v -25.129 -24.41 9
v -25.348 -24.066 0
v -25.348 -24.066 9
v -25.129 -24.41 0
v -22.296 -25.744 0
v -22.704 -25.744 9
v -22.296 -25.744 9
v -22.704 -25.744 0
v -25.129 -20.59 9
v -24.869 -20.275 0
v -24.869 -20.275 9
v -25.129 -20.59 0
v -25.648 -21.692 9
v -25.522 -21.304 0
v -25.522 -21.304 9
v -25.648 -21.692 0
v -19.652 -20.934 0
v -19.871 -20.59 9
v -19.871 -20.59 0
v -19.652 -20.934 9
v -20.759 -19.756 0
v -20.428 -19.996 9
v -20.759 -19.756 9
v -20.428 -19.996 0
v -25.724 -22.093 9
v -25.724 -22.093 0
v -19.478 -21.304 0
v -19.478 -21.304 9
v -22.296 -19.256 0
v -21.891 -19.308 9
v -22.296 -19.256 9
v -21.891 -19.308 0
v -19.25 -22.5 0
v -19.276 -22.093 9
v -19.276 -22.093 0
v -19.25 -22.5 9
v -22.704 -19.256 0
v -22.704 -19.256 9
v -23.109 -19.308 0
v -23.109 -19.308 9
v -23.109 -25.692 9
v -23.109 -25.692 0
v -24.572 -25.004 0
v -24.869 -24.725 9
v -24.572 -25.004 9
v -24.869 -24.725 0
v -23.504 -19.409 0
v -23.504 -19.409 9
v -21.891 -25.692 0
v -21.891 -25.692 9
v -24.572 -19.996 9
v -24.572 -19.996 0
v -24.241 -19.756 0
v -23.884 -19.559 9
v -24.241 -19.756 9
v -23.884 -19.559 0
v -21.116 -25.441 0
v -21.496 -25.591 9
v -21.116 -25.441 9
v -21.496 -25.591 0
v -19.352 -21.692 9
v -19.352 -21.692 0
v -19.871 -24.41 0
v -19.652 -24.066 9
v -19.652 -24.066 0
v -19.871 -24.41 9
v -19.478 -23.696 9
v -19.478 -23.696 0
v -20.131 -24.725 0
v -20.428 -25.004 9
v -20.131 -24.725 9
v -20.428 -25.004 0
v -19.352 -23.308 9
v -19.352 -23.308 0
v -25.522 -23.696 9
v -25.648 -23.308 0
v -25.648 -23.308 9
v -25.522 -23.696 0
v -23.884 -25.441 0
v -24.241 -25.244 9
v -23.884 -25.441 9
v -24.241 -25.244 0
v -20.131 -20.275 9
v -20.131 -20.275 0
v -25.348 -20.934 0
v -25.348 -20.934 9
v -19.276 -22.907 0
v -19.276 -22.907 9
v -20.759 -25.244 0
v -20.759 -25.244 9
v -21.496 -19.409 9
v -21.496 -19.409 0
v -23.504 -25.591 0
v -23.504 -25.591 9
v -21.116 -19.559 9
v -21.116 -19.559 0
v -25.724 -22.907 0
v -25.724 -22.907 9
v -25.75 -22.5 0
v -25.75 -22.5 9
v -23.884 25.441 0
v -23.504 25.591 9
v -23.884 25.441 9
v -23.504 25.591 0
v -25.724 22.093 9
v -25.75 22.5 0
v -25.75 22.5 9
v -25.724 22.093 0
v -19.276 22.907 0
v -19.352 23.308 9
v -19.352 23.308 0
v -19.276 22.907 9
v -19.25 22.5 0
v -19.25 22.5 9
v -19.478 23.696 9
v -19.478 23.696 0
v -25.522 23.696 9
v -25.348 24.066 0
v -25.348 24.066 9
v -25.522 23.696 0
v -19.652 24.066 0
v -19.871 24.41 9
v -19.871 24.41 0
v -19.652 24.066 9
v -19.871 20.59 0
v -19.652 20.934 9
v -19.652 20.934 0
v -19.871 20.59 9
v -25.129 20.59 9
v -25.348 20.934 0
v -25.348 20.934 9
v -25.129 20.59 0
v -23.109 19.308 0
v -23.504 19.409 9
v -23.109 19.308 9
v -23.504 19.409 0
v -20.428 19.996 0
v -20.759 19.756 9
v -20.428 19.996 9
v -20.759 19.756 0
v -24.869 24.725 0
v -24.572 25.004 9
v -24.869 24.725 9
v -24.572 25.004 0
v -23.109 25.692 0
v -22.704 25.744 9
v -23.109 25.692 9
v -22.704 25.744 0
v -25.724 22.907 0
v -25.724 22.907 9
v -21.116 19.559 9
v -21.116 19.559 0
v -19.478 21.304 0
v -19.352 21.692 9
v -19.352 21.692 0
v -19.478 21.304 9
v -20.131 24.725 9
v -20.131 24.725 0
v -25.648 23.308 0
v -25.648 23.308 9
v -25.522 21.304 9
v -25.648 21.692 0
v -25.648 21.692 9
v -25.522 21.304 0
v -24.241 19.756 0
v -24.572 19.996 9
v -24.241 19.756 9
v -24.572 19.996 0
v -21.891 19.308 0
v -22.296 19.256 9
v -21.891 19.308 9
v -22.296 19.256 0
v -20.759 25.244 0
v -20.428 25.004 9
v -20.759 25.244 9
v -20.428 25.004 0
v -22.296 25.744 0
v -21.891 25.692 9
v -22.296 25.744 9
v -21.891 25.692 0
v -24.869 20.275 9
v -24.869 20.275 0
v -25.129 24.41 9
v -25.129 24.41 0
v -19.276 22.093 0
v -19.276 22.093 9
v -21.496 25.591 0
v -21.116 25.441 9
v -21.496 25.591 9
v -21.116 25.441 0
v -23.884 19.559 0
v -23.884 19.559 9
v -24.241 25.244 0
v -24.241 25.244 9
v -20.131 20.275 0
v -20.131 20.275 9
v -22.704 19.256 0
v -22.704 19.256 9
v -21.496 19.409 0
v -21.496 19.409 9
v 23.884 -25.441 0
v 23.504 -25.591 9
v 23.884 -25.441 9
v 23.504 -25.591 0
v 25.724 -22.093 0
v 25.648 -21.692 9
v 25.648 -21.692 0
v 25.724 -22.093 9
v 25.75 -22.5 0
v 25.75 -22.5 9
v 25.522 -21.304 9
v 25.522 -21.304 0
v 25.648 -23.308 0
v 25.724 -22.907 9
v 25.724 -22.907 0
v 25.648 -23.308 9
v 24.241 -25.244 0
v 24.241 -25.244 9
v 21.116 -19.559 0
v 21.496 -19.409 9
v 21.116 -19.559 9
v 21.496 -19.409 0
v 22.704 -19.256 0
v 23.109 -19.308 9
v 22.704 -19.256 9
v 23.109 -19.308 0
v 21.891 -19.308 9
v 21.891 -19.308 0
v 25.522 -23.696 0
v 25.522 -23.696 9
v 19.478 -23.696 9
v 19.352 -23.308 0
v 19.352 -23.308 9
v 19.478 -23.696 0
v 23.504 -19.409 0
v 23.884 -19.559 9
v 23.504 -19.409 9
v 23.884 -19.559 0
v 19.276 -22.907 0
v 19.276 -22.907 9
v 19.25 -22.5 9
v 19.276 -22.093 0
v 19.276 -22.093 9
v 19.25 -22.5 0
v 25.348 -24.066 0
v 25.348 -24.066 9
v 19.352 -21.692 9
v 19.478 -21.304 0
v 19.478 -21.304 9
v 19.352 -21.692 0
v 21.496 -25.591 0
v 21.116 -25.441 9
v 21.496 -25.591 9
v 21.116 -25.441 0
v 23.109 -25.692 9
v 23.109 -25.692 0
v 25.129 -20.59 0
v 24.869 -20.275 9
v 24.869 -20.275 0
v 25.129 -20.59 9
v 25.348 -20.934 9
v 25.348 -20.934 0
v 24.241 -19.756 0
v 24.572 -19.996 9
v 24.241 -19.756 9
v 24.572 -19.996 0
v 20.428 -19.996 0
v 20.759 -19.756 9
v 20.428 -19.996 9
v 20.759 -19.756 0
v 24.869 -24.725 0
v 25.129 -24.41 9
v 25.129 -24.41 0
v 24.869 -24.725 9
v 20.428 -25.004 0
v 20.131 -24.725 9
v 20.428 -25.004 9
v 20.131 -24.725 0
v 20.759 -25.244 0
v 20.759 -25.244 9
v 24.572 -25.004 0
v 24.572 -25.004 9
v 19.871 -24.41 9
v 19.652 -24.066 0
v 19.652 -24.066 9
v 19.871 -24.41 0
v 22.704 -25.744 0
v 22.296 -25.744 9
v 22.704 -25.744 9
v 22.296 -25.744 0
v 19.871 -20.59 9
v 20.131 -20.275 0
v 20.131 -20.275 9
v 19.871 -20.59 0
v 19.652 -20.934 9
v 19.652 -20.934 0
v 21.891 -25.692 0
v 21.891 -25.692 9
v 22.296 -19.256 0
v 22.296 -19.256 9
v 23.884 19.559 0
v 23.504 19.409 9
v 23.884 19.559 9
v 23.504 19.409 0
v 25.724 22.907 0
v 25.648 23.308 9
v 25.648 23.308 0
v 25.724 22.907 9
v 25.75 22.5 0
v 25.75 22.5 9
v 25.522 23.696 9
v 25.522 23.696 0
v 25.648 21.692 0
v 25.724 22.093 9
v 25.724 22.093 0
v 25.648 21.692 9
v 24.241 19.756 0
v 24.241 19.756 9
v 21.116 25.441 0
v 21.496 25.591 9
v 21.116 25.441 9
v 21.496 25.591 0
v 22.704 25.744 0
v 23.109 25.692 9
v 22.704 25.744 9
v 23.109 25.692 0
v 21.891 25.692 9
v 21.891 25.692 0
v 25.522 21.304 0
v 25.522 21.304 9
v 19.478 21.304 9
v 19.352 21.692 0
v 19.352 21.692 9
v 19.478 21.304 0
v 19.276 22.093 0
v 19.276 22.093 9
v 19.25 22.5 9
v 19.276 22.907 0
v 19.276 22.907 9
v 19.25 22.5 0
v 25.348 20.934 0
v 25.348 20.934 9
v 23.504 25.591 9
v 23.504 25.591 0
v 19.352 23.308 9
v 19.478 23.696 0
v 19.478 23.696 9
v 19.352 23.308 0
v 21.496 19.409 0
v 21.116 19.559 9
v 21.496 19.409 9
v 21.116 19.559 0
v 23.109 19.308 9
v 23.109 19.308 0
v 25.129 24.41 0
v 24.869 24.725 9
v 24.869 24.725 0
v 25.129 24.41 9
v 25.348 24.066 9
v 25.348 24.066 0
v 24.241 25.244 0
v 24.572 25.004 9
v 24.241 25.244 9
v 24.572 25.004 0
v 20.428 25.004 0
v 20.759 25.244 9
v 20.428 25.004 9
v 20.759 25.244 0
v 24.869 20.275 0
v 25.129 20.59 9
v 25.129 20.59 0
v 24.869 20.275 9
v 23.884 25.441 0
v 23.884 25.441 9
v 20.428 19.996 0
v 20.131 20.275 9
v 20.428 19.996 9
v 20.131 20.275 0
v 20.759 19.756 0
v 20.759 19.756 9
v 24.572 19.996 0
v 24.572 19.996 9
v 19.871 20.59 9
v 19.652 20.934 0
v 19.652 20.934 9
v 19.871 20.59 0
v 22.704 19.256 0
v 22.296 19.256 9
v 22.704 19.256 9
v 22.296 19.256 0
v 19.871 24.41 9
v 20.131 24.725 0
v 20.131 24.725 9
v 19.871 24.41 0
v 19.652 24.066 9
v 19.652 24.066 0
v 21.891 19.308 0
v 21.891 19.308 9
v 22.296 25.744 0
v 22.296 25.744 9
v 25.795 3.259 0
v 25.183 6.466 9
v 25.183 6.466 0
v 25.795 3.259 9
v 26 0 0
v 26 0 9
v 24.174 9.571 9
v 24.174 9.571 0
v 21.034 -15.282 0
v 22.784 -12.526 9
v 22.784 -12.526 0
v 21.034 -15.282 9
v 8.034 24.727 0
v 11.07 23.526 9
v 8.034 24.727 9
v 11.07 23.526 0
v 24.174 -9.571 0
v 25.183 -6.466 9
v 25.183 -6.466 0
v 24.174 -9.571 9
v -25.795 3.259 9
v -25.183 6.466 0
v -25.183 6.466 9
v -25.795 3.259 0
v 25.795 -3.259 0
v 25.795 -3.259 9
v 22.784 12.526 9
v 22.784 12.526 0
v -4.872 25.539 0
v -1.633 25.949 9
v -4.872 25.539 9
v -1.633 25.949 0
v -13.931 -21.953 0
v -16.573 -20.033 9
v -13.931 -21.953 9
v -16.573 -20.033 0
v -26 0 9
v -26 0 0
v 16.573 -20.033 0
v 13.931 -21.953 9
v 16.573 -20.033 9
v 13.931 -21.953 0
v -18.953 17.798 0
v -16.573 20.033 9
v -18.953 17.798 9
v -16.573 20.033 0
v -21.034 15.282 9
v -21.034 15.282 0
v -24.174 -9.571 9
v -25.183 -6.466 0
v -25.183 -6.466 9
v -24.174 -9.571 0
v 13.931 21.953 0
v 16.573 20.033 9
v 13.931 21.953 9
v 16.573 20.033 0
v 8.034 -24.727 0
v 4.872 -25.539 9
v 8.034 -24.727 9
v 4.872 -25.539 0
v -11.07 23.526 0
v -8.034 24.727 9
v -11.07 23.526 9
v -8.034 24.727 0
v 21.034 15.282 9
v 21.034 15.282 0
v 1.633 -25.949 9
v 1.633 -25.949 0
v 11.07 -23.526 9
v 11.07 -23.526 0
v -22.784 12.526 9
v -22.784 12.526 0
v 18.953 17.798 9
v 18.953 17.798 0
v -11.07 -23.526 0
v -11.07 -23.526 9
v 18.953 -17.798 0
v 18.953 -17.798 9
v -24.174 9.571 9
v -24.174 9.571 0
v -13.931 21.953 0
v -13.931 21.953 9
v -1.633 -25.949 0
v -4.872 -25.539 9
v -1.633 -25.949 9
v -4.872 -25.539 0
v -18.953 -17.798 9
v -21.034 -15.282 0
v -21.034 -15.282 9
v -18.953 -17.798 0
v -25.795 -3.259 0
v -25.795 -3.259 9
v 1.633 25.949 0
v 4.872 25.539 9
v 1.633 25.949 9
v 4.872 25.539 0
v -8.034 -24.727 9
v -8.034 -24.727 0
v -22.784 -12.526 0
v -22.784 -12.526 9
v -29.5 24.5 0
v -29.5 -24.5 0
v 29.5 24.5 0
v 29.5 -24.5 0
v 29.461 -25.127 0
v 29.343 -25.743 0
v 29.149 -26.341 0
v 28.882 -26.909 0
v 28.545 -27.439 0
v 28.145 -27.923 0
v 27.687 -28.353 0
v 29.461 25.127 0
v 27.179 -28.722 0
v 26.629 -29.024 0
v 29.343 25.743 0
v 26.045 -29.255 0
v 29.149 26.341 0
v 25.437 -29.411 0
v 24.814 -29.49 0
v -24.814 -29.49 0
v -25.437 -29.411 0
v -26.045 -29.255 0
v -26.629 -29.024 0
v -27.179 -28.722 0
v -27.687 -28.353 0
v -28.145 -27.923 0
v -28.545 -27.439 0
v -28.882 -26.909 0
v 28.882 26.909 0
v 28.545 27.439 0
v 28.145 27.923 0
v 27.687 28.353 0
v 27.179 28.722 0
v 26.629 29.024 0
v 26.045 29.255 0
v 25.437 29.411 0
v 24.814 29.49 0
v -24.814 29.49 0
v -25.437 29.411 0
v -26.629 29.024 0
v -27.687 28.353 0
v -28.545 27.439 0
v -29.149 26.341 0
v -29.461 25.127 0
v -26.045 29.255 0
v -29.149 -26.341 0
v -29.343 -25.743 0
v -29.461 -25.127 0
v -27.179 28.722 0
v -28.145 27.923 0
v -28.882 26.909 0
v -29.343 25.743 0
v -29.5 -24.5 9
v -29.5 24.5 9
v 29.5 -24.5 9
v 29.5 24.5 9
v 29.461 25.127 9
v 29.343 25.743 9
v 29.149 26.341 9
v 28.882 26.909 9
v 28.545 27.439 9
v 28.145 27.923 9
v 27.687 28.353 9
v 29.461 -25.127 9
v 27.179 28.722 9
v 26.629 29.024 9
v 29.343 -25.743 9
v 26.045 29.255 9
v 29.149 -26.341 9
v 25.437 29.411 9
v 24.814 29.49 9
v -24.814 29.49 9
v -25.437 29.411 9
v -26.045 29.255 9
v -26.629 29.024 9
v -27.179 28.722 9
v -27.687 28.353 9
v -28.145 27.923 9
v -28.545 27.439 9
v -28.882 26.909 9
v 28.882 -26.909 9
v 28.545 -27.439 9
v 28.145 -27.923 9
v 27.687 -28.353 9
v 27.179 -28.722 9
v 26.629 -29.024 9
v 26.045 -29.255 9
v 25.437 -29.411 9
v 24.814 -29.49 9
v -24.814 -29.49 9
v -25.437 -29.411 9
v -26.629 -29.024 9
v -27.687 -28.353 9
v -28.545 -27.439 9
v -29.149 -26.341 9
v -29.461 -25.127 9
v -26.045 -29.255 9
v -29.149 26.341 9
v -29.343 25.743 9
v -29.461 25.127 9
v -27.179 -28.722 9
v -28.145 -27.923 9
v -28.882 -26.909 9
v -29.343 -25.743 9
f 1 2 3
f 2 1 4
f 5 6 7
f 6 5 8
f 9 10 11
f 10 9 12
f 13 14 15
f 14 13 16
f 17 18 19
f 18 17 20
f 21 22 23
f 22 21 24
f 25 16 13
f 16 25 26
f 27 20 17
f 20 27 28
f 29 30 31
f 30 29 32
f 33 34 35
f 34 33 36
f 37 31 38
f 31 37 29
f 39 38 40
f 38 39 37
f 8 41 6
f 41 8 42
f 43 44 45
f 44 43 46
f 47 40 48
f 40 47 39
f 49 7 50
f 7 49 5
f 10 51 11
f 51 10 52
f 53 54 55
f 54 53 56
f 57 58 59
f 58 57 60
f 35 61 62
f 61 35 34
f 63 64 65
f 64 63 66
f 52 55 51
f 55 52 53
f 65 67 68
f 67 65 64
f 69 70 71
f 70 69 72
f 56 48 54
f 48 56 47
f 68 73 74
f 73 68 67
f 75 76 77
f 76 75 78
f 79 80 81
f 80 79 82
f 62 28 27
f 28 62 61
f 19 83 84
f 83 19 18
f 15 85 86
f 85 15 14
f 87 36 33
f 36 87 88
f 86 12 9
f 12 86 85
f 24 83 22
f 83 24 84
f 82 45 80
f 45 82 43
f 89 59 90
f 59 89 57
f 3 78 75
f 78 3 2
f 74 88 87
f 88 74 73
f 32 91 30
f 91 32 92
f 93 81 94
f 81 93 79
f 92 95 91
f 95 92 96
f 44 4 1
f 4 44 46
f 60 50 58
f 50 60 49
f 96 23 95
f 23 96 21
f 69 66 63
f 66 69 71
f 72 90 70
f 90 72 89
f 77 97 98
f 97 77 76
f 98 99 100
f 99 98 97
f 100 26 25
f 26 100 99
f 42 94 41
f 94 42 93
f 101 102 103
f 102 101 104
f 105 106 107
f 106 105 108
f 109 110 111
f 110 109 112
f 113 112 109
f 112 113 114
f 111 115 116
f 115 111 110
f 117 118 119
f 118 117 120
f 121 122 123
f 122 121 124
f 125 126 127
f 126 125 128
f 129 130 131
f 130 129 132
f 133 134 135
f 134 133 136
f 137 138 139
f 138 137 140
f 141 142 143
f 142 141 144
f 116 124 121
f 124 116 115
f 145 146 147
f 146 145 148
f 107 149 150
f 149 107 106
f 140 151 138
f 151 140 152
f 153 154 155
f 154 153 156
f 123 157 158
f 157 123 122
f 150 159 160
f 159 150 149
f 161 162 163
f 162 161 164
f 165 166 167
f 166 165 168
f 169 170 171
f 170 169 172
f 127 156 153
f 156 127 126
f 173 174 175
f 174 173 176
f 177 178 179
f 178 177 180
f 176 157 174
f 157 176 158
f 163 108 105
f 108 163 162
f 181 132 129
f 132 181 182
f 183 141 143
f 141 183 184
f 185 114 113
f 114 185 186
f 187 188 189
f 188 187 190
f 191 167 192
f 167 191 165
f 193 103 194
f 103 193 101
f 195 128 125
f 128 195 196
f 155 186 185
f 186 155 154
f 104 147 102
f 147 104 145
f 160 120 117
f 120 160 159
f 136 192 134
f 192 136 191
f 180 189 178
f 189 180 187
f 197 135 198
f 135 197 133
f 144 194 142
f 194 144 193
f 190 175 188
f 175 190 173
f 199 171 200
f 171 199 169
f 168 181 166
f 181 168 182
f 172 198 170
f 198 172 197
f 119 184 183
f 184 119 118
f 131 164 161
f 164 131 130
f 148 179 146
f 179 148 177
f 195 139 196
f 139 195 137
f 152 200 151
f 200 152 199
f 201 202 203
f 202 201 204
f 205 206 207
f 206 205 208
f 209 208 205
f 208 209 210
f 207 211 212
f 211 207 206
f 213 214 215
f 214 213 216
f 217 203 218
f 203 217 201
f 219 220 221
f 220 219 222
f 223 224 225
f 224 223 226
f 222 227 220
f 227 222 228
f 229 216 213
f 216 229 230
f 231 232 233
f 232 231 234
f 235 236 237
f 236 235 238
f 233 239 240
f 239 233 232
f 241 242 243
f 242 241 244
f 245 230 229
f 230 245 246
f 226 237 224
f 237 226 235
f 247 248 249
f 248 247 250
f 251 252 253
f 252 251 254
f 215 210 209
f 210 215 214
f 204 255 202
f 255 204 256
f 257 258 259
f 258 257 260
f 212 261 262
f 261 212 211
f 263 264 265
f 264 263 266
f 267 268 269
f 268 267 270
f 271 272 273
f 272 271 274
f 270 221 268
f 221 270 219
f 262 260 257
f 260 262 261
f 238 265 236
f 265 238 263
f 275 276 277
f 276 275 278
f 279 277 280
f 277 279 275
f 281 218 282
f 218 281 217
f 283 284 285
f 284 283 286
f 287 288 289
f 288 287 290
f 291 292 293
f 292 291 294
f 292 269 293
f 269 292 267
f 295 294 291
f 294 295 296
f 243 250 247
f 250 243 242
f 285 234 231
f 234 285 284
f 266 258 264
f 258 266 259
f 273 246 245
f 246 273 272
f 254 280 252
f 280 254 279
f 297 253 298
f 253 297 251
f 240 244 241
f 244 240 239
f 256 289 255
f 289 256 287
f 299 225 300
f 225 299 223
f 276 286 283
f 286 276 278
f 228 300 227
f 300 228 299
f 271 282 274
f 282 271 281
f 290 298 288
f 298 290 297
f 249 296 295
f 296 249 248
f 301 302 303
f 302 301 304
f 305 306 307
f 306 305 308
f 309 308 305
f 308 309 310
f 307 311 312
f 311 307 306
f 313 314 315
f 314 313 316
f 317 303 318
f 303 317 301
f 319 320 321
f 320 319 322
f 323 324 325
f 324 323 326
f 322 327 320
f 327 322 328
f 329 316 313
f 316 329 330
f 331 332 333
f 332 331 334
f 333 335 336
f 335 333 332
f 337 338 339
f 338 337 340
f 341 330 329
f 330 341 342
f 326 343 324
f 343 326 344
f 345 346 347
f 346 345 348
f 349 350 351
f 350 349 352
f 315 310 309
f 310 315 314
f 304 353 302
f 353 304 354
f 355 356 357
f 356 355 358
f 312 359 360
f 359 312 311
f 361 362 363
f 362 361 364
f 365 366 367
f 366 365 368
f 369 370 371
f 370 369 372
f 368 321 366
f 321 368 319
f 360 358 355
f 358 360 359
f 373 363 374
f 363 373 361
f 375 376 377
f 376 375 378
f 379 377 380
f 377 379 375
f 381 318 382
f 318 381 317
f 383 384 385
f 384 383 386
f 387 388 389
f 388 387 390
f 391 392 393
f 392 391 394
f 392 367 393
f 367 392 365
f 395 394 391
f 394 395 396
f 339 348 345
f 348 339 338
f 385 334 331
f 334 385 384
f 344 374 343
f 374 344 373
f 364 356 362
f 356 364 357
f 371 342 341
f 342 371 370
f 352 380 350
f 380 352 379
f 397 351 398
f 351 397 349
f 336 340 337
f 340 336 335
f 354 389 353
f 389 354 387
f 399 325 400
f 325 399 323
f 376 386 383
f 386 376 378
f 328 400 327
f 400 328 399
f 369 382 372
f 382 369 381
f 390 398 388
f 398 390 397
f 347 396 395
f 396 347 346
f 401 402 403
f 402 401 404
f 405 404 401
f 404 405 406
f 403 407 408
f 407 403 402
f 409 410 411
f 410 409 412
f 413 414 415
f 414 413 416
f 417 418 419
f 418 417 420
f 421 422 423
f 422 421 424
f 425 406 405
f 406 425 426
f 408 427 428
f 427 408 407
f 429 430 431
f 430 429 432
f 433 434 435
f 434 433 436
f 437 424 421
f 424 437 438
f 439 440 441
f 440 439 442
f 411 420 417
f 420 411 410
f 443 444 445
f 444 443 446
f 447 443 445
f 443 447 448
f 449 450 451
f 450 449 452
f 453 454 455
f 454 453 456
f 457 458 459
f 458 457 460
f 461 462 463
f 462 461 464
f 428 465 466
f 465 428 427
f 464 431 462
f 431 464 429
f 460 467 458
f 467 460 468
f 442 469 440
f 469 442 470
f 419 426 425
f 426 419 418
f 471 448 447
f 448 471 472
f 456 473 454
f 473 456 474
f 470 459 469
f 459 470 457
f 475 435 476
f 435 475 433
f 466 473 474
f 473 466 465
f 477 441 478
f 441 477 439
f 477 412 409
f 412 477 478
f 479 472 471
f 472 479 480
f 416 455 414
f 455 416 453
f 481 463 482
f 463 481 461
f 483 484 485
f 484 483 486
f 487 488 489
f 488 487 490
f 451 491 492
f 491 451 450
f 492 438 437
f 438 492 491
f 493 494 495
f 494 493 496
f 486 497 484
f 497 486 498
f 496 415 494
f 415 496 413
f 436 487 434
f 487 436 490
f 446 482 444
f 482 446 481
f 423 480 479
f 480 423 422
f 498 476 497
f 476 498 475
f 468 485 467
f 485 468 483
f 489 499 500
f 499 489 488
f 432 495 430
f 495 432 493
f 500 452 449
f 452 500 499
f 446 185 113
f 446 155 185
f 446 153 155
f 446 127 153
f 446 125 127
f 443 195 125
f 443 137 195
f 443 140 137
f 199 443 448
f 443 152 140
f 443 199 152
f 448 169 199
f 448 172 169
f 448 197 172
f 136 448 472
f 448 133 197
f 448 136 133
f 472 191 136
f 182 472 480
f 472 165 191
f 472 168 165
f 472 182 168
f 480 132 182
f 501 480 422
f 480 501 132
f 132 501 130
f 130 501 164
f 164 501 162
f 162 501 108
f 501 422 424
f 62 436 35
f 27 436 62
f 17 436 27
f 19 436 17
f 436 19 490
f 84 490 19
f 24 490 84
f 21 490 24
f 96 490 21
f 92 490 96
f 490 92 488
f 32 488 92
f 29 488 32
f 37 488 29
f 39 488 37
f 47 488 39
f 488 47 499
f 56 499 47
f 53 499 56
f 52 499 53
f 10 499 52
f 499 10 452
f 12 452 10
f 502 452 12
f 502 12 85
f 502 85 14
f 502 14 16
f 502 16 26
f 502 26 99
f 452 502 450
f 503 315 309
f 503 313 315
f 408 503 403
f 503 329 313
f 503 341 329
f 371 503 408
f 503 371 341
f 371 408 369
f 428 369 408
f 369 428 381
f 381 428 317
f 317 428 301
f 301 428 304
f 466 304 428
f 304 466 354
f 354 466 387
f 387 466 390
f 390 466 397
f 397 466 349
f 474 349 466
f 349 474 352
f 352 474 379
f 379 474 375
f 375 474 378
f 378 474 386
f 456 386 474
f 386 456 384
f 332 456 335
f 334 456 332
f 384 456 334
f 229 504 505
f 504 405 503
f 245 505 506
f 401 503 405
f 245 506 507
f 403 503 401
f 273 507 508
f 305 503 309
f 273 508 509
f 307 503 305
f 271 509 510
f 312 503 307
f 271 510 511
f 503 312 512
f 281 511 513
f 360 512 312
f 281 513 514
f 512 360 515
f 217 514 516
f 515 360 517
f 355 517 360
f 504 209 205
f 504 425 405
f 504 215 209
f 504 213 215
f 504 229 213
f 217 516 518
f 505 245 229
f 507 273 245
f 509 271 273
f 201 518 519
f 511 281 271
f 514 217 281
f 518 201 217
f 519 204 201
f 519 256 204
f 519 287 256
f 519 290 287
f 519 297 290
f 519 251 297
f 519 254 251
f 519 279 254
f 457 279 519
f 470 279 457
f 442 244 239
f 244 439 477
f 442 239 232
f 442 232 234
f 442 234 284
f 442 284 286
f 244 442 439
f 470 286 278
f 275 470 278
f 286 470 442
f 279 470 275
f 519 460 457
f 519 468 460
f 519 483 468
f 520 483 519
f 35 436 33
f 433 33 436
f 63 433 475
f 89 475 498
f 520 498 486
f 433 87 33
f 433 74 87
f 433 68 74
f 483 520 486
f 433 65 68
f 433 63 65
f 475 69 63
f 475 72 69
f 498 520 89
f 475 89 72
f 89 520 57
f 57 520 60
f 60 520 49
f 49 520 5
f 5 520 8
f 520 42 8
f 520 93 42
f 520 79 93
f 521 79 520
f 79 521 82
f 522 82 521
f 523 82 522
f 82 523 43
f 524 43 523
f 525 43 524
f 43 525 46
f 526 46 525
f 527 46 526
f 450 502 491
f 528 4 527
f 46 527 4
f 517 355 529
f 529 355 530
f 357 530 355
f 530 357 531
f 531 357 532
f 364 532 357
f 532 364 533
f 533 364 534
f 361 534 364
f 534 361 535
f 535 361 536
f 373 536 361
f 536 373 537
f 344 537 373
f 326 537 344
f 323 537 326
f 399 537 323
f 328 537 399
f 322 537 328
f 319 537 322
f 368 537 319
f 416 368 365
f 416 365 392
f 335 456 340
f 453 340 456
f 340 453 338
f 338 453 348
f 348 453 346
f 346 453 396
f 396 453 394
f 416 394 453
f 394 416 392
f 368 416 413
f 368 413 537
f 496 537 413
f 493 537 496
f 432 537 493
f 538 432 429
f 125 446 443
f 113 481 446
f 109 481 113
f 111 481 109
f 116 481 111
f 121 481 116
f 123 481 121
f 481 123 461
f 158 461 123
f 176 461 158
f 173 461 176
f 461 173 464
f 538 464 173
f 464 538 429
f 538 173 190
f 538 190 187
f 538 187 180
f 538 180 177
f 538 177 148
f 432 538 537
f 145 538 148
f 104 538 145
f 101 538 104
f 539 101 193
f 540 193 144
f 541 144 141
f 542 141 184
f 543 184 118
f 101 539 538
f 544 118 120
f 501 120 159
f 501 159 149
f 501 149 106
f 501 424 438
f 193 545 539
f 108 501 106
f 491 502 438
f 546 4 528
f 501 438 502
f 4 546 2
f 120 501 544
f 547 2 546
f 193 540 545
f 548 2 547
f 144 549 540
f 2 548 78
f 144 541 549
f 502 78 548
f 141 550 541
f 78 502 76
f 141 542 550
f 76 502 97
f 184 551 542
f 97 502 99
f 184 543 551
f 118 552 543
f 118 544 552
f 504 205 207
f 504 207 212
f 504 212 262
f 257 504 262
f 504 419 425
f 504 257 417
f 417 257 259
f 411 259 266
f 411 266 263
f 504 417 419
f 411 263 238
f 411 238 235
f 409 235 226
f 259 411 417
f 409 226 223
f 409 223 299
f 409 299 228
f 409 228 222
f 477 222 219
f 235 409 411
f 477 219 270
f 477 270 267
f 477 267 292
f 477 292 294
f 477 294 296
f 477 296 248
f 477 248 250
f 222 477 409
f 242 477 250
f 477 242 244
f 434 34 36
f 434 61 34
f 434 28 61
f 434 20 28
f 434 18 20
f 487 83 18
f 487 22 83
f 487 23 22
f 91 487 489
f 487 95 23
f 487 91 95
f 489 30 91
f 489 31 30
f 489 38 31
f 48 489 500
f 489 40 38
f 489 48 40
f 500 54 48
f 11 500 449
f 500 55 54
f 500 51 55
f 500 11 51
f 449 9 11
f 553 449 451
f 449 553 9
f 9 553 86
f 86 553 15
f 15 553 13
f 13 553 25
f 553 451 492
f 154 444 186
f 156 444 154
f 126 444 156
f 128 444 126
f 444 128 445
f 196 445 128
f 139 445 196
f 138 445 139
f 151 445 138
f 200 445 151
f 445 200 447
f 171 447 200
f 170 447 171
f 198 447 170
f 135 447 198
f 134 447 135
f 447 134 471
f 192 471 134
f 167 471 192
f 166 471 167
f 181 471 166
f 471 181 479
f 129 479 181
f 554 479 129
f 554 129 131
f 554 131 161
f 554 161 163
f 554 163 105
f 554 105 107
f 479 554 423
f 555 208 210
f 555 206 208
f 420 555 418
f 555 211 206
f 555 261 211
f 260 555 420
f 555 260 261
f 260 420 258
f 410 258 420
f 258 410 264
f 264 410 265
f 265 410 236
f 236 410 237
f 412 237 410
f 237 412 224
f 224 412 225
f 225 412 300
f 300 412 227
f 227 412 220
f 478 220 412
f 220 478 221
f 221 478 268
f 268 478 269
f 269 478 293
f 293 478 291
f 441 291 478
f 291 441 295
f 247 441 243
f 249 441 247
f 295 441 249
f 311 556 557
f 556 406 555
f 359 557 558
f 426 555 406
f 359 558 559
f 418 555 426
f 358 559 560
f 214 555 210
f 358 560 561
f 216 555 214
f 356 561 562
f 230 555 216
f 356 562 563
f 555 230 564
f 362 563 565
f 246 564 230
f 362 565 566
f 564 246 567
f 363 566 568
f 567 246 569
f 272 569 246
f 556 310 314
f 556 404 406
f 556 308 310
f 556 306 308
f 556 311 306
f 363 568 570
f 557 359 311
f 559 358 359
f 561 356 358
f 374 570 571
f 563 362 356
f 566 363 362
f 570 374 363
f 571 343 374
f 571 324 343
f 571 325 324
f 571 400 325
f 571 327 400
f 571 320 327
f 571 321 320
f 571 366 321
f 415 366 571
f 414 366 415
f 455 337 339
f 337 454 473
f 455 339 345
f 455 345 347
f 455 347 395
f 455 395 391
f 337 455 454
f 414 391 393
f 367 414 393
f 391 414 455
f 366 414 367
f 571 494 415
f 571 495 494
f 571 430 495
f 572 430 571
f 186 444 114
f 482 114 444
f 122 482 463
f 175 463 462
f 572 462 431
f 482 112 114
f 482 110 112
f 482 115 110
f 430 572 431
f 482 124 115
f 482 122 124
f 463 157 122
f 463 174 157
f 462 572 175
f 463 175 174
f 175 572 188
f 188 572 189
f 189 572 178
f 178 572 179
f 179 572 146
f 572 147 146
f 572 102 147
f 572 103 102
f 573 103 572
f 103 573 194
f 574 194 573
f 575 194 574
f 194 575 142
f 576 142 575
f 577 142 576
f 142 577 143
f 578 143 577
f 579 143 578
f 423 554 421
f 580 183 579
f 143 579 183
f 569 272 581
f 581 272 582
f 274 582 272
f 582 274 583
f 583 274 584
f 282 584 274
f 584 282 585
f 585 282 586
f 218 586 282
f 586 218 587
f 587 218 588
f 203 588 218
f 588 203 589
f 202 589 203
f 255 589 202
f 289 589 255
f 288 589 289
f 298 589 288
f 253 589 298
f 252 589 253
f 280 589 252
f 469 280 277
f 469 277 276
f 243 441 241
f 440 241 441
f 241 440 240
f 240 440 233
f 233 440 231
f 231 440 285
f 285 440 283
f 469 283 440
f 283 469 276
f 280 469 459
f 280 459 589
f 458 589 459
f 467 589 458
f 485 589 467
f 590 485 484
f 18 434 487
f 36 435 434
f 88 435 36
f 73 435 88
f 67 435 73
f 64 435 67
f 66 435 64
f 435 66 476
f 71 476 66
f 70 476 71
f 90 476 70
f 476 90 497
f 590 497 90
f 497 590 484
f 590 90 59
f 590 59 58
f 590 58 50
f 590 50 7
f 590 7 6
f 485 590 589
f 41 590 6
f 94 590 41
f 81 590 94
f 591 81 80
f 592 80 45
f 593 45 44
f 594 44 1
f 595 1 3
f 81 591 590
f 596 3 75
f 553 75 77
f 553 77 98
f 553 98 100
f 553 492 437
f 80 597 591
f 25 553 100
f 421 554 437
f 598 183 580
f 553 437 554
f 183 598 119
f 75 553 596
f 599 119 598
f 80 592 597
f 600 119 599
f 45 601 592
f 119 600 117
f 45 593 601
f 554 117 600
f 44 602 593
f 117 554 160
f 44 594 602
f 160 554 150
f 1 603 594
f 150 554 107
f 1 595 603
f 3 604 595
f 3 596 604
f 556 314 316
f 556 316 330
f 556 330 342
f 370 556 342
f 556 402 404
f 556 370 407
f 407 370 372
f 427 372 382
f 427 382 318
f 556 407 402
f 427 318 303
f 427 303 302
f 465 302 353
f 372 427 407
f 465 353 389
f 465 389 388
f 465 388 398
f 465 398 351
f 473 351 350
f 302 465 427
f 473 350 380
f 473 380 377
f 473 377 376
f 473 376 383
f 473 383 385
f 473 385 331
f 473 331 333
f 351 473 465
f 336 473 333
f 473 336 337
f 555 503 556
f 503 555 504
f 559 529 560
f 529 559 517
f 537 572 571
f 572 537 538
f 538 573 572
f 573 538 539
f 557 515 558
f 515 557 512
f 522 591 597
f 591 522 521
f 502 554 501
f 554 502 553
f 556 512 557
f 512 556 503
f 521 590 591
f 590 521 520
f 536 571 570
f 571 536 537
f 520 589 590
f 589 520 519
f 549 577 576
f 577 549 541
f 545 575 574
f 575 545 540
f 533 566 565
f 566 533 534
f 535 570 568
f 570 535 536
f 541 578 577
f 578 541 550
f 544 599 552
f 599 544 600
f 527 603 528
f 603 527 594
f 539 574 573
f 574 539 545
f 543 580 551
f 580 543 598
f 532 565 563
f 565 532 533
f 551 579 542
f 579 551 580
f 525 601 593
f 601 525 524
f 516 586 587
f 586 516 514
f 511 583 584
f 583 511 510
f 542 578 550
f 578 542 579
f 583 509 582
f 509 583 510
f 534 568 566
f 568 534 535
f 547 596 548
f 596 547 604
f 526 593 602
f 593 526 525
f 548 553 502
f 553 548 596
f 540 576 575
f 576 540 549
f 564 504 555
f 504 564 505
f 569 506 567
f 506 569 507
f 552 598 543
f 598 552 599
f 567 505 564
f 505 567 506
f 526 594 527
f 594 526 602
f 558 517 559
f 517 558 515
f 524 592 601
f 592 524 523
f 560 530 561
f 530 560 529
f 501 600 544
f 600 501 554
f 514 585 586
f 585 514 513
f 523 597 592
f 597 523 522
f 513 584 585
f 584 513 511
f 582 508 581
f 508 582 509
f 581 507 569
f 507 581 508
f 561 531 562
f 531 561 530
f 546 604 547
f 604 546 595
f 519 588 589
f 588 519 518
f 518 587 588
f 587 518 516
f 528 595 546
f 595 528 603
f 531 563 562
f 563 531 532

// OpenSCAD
$fn = 50;


difference() {
	union() {
		hull() {
			translate(v = [-24.5000000000, 24.5000000000, 0]) {
				cylinder(h = 9, r = 5);
			}
			translate(v = [24.5000000000, 24.5000000000, 0]) {
				cylinder(h = 9, r = 5);
			}
			translate(v = [-24.5000000000, -24.5000000000, 0]) {
				cylinder(h = 9, r = 5);
			}
			translate(v = [24.5000000000, -24.5000000000, 0]) {
				cylinder(h = 9, r = 5);
			}
		}
	}
	union() {
		#translate(v = [-22.5000000000, -22.5000000000, -100.0000000000]) {
			cylinder(h = 200, r = 3.2500000000);
		}
		#translate(v = [-22.5000000000, 22.5000000000, -100.0000000000]) {
			cylinder(h = 200, r = 3.2500000000);
		}
		#translate(v = [22.5000000000, -22.5000000000, -100.0000000000]) {
			cylinder(h = 200, r = 3.2500000000);
		}
		#translate(v = [22.5000000000, 22.5000000000, -100.0000000000]) {
			cylinder(h = 200, r = 3.2500000000);
		}
		#cylinder(h = 9, r = 26.0000000000);
	}
}
